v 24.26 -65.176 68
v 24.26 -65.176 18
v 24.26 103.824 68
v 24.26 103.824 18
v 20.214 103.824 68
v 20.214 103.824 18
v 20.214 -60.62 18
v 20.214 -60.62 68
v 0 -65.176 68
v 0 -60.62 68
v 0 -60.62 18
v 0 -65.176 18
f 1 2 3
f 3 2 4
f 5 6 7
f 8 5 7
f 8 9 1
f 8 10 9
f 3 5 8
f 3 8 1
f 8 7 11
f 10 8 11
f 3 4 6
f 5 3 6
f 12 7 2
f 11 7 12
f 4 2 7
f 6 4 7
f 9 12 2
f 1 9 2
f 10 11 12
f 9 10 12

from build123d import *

# Parameters (mm, degrees)
BOSS_EXTRUDE1_DEPTH = 68
CUT_EXTRUDE1_START  = -18
CUT_EXTRUDE1_DEPTH  = 18


with BuildPart() as part:
    # Sketch1 → Boss-Extrude1 (new body)
    with BuildSketch(Plane.XY):
        Polygon((0, -65.175603221), (24.260410468, -65.175603221), (24.260410468, 103.824396779), (20.214170688, 103.824396779), (20.214170688, -60.620021665), (0, -60.620021665), align=None)
    extrude(amount=BOSS_EXTRUDE1_DEPTH)

    # Sketch2 → Cut-Extrude1 (cut)
    with BuildSketch(Plane(origin=(0, 0, 0), x_dir=(-1, 0, 0), z_dir=(0, 0, -1)).offset(CUT_EXTRUDE1_START)):
        Polygon((0, -65.175603221), (0, -60.620021665), (-20.214170688, -60.620021665), (-20.214170688, 103.824396779), (-24.260410468, 103.824396779), (-24.260410468, -65.175603221), align=None)
    extrude(amount=CUT_EXTRUDE1_DEPTH, mode=Mode.SUBTRACT)


solid = part.part
